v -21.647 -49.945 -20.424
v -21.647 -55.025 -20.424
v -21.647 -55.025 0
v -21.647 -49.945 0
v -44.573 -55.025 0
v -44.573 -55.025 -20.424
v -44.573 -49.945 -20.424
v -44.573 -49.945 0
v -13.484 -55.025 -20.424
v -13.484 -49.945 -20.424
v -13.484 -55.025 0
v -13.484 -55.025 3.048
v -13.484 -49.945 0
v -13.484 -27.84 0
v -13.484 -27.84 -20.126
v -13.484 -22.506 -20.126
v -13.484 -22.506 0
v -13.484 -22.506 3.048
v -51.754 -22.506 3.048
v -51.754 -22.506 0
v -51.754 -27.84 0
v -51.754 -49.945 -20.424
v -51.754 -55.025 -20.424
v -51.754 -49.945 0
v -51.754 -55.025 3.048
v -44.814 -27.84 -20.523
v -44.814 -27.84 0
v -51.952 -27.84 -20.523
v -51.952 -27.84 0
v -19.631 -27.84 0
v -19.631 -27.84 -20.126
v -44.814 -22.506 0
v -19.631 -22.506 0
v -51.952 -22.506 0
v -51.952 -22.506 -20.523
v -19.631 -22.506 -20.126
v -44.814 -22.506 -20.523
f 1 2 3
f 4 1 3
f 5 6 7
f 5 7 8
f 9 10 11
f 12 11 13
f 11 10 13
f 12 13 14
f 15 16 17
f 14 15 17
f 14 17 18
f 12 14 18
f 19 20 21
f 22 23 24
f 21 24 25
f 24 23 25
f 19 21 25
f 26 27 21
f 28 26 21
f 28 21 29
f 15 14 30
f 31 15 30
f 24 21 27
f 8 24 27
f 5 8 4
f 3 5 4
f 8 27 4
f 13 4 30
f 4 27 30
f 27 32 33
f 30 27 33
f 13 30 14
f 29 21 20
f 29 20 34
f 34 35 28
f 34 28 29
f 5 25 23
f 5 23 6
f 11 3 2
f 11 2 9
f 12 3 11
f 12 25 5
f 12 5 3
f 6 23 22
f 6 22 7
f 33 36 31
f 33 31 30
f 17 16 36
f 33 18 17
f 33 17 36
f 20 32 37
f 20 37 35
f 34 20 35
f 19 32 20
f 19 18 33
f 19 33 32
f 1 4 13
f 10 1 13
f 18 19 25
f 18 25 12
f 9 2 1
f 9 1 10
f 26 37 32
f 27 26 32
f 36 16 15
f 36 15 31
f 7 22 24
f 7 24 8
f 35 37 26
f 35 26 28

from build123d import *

# Parameters (mm, degrees)
F0_W     = 38.2699640468
F0_H     = 32.5195547193
F1_DEPTH = 3.048
F2_W     = 6.1469888315
F2_H     = 20.1264321804
F2_W_2   = 7.1384422481
F2_H_2   = 20.5230116844
F3_DEPTH = 5.334
F4_W     = 7.1802772582
F4_H     = 23.4715147685
F4_W_2   = 8.1633431837
F5_DEPTH = 5.08


with BuildPart() as f1:
    # F0 (on Top) → F1 (new body)
    with BuildSketch(Plane.XY):
        with Locations((-32.6186991297, -38.7656884268)):
            Rectangle(F0_W, F0_H)
    extrude(amount=F1_DEPTH)

    # F2 (on face) → F3 (join)
    with BuildSketch(Plane(origin=(0, -22.5059110671, 0), x_dir=(-1, 0, 0), z_dir=(0, 1, 0))):
        with Locations((16.557211522, -10.0632160902)):
            Rectangle(F2_W, F2_H)
        with Locations((48.382749781, -10.2615058422)):
            Rectangle(F2_W_2, F2_H_2)
    extrude(amount=-F3_DEPTH)

    # F4 (on face) → F5 (join)
    with BuildSketch(Plane.XZ.offset(55.0254657865)):
        with Locations((-48.163542524, -8.6877573842)):
            Rectangle(F4_W, F4_H)
        with Locations((-17.5653886981, -8.6877573842)):
            Rectangle(F4_W_2, F4_H)
    extrude(amount=-F5_DEPTH)


solid = f1.part
